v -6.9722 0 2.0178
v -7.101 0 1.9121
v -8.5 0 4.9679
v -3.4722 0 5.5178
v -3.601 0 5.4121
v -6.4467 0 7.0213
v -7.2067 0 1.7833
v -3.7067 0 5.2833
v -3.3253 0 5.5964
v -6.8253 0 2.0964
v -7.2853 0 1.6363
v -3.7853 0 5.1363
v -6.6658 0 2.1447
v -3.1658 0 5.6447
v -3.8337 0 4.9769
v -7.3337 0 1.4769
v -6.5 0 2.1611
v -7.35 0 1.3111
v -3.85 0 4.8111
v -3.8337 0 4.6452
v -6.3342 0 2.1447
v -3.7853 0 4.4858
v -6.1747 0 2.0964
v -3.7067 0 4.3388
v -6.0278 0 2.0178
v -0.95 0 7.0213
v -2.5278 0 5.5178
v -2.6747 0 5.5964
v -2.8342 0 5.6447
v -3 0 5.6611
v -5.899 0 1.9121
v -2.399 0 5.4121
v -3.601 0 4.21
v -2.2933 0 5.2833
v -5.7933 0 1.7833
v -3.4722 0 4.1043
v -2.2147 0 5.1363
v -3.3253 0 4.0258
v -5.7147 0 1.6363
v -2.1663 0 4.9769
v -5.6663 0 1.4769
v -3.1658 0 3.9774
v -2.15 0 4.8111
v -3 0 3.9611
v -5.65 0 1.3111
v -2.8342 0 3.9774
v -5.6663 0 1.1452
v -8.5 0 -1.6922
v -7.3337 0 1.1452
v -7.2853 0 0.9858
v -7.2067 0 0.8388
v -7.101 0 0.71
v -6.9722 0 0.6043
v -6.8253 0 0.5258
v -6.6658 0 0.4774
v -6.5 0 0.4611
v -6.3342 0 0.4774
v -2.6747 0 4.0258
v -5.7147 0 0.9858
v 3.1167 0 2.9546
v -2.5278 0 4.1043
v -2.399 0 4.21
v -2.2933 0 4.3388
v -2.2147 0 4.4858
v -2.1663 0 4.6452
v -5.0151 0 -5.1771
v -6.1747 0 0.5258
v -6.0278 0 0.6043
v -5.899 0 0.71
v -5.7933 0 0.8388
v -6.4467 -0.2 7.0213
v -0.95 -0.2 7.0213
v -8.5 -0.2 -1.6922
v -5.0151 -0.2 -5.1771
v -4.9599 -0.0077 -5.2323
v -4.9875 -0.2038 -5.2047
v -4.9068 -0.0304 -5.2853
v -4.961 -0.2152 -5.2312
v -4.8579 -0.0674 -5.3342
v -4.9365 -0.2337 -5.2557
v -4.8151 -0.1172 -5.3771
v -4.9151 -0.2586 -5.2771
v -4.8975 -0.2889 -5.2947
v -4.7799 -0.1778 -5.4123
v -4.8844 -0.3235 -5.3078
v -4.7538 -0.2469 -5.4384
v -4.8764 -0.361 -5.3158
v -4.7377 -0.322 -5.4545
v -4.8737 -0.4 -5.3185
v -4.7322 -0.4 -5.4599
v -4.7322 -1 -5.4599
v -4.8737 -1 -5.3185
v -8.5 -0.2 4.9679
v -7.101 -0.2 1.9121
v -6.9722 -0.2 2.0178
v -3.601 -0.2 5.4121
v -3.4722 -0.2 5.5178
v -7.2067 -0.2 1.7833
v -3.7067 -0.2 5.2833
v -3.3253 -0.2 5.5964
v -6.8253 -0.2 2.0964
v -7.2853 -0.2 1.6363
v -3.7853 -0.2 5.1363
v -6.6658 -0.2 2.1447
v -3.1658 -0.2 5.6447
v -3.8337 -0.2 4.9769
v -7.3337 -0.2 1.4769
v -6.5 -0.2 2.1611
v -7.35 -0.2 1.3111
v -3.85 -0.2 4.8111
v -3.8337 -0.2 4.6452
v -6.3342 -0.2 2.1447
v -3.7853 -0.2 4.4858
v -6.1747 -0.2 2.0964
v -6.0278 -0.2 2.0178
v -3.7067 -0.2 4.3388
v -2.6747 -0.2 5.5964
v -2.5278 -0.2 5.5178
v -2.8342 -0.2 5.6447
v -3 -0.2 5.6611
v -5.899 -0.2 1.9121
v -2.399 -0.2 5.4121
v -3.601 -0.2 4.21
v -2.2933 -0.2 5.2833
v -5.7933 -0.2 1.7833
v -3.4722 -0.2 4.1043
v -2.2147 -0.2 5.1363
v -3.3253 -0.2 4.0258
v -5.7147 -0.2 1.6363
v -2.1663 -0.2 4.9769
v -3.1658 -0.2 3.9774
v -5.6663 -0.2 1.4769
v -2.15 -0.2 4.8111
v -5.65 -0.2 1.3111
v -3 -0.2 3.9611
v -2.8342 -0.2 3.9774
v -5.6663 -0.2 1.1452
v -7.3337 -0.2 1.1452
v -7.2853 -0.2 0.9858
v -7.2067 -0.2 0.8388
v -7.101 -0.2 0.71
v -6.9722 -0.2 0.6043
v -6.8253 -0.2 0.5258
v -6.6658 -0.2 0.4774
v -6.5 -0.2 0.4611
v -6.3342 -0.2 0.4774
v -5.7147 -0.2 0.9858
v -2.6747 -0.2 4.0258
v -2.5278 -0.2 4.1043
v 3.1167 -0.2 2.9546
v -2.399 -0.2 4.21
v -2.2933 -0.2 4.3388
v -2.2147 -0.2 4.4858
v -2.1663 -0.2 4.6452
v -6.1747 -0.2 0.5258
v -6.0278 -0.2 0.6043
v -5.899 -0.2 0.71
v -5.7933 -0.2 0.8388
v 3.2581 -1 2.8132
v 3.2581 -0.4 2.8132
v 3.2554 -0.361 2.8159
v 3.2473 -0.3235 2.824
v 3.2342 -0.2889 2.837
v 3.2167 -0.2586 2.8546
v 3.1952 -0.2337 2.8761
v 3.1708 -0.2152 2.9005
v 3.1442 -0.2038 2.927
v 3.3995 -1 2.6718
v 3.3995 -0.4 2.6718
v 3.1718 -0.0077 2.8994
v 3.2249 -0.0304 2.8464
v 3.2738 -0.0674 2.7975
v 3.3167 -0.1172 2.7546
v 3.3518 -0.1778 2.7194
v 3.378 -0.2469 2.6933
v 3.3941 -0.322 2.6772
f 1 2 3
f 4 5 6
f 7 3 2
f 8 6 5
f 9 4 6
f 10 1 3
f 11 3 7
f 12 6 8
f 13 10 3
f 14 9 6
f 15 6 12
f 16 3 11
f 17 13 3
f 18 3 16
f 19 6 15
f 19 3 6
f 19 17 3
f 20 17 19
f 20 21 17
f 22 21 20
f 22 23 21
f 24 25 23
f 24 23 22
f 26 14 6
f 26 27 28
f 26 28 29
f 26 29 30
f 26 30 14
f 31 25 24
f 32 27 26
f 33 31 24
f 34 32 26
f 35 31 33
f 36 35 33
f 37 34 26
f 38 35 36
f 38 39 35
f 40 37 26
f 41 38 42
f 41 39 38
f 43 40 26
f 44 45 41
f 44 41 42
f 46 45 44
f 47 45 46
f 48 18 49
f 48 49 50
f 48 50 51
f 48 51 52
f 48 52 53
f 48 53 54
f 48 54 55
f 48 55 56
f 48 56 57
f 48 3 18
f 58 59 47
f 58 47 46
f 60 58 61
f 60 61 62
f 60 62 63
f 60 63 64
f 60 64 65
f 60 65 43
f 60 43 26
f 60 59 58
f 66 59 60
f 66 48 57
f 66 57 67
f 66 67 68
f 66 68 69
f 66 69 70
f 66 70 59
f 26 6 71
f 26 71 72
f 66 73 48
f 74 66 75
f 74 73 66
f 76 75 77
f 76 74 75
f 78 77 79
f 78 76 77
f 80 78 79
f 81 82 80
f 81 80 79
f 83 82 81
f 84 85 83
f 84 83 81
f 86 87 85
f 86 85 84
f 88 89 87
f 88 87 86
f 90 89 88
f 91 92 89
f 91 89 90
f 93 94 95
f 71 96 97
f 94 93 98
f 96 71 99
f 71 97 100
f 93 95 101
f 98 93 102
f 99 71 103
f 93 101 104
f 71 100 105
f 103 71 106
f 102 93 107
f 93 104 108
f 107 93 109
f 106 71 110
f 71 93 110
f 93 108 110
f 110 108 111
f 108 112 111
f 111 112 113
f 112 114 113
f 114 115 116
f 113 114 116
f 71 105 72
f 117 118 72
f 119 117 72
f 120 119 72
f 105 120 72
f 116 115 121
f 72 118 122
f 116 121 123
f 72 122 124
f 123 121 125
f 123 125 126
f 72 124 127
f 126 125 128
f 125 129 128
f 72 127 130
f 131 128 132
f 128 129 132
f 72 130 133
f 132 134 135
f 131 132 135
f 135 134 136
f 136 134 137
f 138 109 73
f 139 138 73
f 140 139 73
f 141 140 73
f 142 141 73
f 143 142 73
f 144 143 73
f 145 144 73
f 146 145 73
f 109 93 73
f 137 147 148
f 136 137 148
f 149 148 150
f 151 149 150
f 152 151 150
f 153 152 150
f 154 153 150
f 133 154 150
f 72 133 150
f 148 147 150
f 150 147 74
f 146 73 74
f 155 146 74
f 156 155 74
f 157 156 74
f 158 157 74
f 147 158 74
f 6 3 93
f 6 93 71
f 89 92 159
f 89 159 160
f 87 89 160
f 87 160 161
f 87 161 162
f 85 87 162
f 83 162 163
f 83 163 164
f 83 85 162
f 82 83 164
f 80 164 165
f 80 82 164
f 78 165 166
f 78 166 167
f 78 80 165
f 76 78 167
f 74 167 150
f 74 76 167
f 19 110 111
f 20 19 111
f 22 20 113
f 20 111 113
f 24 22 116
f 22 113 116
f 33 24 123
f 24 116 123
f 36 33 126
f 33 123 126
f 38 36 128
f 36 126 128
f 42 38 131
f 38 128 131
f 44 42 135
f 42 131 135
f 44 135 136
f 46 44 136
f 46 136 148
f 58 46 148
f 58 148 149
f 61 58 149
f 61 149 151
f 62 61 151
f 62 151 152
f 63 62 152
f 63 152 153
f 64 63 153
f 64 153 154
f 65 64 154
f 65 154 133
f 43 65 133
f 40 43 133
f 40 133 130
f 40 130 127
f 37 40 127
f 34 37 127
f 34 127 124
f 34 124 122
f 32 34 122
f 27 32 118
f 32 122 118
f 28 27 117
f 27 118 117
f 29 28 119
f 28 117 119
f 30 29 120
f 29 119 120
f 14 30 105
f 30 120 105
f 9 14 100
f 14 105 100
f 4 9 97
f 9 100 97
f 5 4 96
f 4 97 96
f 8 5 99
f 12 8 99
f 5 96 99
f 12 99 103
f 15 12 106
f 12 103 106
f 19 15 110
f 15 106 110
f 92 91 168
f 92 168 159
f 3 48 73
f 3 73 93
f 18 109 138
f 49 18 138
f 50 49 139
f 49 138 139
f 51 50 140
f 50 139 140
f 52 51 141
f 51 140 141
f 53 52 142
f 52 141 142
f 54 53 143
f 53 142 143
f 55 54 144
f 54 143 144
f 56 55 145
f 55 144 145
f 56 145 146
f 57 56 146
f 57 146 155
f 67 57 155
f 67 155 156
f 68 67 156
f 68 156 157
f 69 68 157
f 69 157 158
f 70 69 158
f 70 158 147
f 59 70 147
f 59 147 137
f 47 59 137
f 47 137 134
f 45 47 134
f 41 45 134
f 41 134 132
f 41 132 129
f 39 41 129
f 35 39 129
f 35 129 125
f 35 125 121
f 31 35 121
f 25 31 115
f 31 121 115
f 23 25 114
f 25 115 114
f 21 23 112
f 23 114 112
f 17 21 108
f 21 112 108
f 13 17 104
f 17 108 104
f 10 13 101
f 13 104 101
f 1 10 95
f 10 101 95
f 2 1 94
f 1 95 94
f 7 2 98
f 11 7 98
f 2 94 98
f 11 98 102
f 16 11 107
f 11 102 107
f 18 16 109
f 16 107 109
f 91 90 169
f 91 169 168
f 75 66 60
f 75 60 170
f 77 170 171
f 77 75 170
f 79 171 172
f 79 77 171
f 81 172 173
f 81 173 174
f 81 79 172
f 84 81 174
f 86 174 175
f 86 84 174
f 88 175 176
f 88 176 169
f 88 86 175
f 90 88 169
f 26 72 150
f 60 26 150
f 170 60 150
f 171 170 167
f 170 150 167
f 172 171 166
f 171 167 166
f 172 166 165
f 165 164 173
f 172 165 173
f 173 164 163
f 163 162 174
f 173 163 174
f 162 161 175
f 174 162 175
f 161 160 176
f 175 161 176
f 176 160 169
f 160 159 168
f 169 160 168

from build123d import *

# Parameters (mm, degrees)
BASE_FLANGE1_DEPTH           = 0.2
EDGE_FLANGE1_STRIP_W         = 1.2
EDGE_FLANGE1_STRIP_H         = 0.2
EDGE_FLANGE1_STRIP_CUT_DEPTH = 11.5
EDGE_FLANGE1_DEPTH           = 11.5
F_1_7_1_7_DIAMETER_HOLE1_D   = 1.7


# Sheet-metal steps are written as plain solids
with BuildPart() as part:
    # Sketch1 → Base-Flange1 (new body)
    with BuildSketch(Plane(origin=(0, 0, 0), x_dir=(1, 0, 0), z_dir=(0, 1, 0))):
        Polygon((-4.873652989, 5.318528304), (-8.5, 1.692181293), (-8.5, -4.967910087), (-6.446655485, -7.021254602), (-0.949979928, -7.021254602), (3.258074995, -2.813199679), align=None)
    extrude(amount=-BASE_FLANGE1_DEPTH)

    # Edge-Flange1 strip (across the edge) → Edge-Flange1 strip cut (cut)
    with BuildSketch(Plane(origin=(-4.873652989, -0.2, -5.318528304), x_dir=(-0.7071067811865558, -3.4914813388431334e-15, 0.7071067811865392), z_dir=(0.7071067811865392, 0, 0.7071067811865558))):
        with Locations((-0.4, -0.1)):
            Rectangle(EDGE_FLANGE1_STRIP_W, EDGE_FLANGE1_STRIP_H)
    extrude(amount=EDGE_FLANGE1_STRIP_CUT_DEPTH, mode=Mode.SUBTRACT)

    # Edge-Flange1 section (across the edge) → Edge-Flange1 (add)
    with BuildSketch(Plane(origin=(-4.873652989, -0.2, -5.318528304), x_dir=(-0.7071067811865558, -3.4914813388431334e-15, 0.7071067811865392), z_dir=(0.7071067811865392, 0, 0.7071067811865558))):
        with BuildLine():
            Line((-0.2, 0.2), (-0.2, 0.8))
            Line((-0.2, 0.8), (0, 0.8))
            Line((0, 0.8), (0, 0.2))
            ThreePointArc((0, 0.2), (0.058578644, 0.058578644), (0.2, 0))
            Line((0.2, 0), (0.2, -0.2))
            ThreePointArc((0.2, -0.2), (-0.082842712, -0.082842712), (-0.2, 0.2))
        make_face()
    extrude(amount=EDGE_FLANGE1_DEPTH)

    # Ø1.7 (1.7) Diameter Hole1 (through all)
    with Locations(Plane(origin=(0, 0, 0), x_dir=(1, 0, 0), z_dir=(0, 1, 0))):
        with Locations((-6.5, -1.311055838), (-3, -4.811055838)):
            Hole(F_1_7_1_7_DIAMETER_HOLE1_D / 2)


solid = part.part
